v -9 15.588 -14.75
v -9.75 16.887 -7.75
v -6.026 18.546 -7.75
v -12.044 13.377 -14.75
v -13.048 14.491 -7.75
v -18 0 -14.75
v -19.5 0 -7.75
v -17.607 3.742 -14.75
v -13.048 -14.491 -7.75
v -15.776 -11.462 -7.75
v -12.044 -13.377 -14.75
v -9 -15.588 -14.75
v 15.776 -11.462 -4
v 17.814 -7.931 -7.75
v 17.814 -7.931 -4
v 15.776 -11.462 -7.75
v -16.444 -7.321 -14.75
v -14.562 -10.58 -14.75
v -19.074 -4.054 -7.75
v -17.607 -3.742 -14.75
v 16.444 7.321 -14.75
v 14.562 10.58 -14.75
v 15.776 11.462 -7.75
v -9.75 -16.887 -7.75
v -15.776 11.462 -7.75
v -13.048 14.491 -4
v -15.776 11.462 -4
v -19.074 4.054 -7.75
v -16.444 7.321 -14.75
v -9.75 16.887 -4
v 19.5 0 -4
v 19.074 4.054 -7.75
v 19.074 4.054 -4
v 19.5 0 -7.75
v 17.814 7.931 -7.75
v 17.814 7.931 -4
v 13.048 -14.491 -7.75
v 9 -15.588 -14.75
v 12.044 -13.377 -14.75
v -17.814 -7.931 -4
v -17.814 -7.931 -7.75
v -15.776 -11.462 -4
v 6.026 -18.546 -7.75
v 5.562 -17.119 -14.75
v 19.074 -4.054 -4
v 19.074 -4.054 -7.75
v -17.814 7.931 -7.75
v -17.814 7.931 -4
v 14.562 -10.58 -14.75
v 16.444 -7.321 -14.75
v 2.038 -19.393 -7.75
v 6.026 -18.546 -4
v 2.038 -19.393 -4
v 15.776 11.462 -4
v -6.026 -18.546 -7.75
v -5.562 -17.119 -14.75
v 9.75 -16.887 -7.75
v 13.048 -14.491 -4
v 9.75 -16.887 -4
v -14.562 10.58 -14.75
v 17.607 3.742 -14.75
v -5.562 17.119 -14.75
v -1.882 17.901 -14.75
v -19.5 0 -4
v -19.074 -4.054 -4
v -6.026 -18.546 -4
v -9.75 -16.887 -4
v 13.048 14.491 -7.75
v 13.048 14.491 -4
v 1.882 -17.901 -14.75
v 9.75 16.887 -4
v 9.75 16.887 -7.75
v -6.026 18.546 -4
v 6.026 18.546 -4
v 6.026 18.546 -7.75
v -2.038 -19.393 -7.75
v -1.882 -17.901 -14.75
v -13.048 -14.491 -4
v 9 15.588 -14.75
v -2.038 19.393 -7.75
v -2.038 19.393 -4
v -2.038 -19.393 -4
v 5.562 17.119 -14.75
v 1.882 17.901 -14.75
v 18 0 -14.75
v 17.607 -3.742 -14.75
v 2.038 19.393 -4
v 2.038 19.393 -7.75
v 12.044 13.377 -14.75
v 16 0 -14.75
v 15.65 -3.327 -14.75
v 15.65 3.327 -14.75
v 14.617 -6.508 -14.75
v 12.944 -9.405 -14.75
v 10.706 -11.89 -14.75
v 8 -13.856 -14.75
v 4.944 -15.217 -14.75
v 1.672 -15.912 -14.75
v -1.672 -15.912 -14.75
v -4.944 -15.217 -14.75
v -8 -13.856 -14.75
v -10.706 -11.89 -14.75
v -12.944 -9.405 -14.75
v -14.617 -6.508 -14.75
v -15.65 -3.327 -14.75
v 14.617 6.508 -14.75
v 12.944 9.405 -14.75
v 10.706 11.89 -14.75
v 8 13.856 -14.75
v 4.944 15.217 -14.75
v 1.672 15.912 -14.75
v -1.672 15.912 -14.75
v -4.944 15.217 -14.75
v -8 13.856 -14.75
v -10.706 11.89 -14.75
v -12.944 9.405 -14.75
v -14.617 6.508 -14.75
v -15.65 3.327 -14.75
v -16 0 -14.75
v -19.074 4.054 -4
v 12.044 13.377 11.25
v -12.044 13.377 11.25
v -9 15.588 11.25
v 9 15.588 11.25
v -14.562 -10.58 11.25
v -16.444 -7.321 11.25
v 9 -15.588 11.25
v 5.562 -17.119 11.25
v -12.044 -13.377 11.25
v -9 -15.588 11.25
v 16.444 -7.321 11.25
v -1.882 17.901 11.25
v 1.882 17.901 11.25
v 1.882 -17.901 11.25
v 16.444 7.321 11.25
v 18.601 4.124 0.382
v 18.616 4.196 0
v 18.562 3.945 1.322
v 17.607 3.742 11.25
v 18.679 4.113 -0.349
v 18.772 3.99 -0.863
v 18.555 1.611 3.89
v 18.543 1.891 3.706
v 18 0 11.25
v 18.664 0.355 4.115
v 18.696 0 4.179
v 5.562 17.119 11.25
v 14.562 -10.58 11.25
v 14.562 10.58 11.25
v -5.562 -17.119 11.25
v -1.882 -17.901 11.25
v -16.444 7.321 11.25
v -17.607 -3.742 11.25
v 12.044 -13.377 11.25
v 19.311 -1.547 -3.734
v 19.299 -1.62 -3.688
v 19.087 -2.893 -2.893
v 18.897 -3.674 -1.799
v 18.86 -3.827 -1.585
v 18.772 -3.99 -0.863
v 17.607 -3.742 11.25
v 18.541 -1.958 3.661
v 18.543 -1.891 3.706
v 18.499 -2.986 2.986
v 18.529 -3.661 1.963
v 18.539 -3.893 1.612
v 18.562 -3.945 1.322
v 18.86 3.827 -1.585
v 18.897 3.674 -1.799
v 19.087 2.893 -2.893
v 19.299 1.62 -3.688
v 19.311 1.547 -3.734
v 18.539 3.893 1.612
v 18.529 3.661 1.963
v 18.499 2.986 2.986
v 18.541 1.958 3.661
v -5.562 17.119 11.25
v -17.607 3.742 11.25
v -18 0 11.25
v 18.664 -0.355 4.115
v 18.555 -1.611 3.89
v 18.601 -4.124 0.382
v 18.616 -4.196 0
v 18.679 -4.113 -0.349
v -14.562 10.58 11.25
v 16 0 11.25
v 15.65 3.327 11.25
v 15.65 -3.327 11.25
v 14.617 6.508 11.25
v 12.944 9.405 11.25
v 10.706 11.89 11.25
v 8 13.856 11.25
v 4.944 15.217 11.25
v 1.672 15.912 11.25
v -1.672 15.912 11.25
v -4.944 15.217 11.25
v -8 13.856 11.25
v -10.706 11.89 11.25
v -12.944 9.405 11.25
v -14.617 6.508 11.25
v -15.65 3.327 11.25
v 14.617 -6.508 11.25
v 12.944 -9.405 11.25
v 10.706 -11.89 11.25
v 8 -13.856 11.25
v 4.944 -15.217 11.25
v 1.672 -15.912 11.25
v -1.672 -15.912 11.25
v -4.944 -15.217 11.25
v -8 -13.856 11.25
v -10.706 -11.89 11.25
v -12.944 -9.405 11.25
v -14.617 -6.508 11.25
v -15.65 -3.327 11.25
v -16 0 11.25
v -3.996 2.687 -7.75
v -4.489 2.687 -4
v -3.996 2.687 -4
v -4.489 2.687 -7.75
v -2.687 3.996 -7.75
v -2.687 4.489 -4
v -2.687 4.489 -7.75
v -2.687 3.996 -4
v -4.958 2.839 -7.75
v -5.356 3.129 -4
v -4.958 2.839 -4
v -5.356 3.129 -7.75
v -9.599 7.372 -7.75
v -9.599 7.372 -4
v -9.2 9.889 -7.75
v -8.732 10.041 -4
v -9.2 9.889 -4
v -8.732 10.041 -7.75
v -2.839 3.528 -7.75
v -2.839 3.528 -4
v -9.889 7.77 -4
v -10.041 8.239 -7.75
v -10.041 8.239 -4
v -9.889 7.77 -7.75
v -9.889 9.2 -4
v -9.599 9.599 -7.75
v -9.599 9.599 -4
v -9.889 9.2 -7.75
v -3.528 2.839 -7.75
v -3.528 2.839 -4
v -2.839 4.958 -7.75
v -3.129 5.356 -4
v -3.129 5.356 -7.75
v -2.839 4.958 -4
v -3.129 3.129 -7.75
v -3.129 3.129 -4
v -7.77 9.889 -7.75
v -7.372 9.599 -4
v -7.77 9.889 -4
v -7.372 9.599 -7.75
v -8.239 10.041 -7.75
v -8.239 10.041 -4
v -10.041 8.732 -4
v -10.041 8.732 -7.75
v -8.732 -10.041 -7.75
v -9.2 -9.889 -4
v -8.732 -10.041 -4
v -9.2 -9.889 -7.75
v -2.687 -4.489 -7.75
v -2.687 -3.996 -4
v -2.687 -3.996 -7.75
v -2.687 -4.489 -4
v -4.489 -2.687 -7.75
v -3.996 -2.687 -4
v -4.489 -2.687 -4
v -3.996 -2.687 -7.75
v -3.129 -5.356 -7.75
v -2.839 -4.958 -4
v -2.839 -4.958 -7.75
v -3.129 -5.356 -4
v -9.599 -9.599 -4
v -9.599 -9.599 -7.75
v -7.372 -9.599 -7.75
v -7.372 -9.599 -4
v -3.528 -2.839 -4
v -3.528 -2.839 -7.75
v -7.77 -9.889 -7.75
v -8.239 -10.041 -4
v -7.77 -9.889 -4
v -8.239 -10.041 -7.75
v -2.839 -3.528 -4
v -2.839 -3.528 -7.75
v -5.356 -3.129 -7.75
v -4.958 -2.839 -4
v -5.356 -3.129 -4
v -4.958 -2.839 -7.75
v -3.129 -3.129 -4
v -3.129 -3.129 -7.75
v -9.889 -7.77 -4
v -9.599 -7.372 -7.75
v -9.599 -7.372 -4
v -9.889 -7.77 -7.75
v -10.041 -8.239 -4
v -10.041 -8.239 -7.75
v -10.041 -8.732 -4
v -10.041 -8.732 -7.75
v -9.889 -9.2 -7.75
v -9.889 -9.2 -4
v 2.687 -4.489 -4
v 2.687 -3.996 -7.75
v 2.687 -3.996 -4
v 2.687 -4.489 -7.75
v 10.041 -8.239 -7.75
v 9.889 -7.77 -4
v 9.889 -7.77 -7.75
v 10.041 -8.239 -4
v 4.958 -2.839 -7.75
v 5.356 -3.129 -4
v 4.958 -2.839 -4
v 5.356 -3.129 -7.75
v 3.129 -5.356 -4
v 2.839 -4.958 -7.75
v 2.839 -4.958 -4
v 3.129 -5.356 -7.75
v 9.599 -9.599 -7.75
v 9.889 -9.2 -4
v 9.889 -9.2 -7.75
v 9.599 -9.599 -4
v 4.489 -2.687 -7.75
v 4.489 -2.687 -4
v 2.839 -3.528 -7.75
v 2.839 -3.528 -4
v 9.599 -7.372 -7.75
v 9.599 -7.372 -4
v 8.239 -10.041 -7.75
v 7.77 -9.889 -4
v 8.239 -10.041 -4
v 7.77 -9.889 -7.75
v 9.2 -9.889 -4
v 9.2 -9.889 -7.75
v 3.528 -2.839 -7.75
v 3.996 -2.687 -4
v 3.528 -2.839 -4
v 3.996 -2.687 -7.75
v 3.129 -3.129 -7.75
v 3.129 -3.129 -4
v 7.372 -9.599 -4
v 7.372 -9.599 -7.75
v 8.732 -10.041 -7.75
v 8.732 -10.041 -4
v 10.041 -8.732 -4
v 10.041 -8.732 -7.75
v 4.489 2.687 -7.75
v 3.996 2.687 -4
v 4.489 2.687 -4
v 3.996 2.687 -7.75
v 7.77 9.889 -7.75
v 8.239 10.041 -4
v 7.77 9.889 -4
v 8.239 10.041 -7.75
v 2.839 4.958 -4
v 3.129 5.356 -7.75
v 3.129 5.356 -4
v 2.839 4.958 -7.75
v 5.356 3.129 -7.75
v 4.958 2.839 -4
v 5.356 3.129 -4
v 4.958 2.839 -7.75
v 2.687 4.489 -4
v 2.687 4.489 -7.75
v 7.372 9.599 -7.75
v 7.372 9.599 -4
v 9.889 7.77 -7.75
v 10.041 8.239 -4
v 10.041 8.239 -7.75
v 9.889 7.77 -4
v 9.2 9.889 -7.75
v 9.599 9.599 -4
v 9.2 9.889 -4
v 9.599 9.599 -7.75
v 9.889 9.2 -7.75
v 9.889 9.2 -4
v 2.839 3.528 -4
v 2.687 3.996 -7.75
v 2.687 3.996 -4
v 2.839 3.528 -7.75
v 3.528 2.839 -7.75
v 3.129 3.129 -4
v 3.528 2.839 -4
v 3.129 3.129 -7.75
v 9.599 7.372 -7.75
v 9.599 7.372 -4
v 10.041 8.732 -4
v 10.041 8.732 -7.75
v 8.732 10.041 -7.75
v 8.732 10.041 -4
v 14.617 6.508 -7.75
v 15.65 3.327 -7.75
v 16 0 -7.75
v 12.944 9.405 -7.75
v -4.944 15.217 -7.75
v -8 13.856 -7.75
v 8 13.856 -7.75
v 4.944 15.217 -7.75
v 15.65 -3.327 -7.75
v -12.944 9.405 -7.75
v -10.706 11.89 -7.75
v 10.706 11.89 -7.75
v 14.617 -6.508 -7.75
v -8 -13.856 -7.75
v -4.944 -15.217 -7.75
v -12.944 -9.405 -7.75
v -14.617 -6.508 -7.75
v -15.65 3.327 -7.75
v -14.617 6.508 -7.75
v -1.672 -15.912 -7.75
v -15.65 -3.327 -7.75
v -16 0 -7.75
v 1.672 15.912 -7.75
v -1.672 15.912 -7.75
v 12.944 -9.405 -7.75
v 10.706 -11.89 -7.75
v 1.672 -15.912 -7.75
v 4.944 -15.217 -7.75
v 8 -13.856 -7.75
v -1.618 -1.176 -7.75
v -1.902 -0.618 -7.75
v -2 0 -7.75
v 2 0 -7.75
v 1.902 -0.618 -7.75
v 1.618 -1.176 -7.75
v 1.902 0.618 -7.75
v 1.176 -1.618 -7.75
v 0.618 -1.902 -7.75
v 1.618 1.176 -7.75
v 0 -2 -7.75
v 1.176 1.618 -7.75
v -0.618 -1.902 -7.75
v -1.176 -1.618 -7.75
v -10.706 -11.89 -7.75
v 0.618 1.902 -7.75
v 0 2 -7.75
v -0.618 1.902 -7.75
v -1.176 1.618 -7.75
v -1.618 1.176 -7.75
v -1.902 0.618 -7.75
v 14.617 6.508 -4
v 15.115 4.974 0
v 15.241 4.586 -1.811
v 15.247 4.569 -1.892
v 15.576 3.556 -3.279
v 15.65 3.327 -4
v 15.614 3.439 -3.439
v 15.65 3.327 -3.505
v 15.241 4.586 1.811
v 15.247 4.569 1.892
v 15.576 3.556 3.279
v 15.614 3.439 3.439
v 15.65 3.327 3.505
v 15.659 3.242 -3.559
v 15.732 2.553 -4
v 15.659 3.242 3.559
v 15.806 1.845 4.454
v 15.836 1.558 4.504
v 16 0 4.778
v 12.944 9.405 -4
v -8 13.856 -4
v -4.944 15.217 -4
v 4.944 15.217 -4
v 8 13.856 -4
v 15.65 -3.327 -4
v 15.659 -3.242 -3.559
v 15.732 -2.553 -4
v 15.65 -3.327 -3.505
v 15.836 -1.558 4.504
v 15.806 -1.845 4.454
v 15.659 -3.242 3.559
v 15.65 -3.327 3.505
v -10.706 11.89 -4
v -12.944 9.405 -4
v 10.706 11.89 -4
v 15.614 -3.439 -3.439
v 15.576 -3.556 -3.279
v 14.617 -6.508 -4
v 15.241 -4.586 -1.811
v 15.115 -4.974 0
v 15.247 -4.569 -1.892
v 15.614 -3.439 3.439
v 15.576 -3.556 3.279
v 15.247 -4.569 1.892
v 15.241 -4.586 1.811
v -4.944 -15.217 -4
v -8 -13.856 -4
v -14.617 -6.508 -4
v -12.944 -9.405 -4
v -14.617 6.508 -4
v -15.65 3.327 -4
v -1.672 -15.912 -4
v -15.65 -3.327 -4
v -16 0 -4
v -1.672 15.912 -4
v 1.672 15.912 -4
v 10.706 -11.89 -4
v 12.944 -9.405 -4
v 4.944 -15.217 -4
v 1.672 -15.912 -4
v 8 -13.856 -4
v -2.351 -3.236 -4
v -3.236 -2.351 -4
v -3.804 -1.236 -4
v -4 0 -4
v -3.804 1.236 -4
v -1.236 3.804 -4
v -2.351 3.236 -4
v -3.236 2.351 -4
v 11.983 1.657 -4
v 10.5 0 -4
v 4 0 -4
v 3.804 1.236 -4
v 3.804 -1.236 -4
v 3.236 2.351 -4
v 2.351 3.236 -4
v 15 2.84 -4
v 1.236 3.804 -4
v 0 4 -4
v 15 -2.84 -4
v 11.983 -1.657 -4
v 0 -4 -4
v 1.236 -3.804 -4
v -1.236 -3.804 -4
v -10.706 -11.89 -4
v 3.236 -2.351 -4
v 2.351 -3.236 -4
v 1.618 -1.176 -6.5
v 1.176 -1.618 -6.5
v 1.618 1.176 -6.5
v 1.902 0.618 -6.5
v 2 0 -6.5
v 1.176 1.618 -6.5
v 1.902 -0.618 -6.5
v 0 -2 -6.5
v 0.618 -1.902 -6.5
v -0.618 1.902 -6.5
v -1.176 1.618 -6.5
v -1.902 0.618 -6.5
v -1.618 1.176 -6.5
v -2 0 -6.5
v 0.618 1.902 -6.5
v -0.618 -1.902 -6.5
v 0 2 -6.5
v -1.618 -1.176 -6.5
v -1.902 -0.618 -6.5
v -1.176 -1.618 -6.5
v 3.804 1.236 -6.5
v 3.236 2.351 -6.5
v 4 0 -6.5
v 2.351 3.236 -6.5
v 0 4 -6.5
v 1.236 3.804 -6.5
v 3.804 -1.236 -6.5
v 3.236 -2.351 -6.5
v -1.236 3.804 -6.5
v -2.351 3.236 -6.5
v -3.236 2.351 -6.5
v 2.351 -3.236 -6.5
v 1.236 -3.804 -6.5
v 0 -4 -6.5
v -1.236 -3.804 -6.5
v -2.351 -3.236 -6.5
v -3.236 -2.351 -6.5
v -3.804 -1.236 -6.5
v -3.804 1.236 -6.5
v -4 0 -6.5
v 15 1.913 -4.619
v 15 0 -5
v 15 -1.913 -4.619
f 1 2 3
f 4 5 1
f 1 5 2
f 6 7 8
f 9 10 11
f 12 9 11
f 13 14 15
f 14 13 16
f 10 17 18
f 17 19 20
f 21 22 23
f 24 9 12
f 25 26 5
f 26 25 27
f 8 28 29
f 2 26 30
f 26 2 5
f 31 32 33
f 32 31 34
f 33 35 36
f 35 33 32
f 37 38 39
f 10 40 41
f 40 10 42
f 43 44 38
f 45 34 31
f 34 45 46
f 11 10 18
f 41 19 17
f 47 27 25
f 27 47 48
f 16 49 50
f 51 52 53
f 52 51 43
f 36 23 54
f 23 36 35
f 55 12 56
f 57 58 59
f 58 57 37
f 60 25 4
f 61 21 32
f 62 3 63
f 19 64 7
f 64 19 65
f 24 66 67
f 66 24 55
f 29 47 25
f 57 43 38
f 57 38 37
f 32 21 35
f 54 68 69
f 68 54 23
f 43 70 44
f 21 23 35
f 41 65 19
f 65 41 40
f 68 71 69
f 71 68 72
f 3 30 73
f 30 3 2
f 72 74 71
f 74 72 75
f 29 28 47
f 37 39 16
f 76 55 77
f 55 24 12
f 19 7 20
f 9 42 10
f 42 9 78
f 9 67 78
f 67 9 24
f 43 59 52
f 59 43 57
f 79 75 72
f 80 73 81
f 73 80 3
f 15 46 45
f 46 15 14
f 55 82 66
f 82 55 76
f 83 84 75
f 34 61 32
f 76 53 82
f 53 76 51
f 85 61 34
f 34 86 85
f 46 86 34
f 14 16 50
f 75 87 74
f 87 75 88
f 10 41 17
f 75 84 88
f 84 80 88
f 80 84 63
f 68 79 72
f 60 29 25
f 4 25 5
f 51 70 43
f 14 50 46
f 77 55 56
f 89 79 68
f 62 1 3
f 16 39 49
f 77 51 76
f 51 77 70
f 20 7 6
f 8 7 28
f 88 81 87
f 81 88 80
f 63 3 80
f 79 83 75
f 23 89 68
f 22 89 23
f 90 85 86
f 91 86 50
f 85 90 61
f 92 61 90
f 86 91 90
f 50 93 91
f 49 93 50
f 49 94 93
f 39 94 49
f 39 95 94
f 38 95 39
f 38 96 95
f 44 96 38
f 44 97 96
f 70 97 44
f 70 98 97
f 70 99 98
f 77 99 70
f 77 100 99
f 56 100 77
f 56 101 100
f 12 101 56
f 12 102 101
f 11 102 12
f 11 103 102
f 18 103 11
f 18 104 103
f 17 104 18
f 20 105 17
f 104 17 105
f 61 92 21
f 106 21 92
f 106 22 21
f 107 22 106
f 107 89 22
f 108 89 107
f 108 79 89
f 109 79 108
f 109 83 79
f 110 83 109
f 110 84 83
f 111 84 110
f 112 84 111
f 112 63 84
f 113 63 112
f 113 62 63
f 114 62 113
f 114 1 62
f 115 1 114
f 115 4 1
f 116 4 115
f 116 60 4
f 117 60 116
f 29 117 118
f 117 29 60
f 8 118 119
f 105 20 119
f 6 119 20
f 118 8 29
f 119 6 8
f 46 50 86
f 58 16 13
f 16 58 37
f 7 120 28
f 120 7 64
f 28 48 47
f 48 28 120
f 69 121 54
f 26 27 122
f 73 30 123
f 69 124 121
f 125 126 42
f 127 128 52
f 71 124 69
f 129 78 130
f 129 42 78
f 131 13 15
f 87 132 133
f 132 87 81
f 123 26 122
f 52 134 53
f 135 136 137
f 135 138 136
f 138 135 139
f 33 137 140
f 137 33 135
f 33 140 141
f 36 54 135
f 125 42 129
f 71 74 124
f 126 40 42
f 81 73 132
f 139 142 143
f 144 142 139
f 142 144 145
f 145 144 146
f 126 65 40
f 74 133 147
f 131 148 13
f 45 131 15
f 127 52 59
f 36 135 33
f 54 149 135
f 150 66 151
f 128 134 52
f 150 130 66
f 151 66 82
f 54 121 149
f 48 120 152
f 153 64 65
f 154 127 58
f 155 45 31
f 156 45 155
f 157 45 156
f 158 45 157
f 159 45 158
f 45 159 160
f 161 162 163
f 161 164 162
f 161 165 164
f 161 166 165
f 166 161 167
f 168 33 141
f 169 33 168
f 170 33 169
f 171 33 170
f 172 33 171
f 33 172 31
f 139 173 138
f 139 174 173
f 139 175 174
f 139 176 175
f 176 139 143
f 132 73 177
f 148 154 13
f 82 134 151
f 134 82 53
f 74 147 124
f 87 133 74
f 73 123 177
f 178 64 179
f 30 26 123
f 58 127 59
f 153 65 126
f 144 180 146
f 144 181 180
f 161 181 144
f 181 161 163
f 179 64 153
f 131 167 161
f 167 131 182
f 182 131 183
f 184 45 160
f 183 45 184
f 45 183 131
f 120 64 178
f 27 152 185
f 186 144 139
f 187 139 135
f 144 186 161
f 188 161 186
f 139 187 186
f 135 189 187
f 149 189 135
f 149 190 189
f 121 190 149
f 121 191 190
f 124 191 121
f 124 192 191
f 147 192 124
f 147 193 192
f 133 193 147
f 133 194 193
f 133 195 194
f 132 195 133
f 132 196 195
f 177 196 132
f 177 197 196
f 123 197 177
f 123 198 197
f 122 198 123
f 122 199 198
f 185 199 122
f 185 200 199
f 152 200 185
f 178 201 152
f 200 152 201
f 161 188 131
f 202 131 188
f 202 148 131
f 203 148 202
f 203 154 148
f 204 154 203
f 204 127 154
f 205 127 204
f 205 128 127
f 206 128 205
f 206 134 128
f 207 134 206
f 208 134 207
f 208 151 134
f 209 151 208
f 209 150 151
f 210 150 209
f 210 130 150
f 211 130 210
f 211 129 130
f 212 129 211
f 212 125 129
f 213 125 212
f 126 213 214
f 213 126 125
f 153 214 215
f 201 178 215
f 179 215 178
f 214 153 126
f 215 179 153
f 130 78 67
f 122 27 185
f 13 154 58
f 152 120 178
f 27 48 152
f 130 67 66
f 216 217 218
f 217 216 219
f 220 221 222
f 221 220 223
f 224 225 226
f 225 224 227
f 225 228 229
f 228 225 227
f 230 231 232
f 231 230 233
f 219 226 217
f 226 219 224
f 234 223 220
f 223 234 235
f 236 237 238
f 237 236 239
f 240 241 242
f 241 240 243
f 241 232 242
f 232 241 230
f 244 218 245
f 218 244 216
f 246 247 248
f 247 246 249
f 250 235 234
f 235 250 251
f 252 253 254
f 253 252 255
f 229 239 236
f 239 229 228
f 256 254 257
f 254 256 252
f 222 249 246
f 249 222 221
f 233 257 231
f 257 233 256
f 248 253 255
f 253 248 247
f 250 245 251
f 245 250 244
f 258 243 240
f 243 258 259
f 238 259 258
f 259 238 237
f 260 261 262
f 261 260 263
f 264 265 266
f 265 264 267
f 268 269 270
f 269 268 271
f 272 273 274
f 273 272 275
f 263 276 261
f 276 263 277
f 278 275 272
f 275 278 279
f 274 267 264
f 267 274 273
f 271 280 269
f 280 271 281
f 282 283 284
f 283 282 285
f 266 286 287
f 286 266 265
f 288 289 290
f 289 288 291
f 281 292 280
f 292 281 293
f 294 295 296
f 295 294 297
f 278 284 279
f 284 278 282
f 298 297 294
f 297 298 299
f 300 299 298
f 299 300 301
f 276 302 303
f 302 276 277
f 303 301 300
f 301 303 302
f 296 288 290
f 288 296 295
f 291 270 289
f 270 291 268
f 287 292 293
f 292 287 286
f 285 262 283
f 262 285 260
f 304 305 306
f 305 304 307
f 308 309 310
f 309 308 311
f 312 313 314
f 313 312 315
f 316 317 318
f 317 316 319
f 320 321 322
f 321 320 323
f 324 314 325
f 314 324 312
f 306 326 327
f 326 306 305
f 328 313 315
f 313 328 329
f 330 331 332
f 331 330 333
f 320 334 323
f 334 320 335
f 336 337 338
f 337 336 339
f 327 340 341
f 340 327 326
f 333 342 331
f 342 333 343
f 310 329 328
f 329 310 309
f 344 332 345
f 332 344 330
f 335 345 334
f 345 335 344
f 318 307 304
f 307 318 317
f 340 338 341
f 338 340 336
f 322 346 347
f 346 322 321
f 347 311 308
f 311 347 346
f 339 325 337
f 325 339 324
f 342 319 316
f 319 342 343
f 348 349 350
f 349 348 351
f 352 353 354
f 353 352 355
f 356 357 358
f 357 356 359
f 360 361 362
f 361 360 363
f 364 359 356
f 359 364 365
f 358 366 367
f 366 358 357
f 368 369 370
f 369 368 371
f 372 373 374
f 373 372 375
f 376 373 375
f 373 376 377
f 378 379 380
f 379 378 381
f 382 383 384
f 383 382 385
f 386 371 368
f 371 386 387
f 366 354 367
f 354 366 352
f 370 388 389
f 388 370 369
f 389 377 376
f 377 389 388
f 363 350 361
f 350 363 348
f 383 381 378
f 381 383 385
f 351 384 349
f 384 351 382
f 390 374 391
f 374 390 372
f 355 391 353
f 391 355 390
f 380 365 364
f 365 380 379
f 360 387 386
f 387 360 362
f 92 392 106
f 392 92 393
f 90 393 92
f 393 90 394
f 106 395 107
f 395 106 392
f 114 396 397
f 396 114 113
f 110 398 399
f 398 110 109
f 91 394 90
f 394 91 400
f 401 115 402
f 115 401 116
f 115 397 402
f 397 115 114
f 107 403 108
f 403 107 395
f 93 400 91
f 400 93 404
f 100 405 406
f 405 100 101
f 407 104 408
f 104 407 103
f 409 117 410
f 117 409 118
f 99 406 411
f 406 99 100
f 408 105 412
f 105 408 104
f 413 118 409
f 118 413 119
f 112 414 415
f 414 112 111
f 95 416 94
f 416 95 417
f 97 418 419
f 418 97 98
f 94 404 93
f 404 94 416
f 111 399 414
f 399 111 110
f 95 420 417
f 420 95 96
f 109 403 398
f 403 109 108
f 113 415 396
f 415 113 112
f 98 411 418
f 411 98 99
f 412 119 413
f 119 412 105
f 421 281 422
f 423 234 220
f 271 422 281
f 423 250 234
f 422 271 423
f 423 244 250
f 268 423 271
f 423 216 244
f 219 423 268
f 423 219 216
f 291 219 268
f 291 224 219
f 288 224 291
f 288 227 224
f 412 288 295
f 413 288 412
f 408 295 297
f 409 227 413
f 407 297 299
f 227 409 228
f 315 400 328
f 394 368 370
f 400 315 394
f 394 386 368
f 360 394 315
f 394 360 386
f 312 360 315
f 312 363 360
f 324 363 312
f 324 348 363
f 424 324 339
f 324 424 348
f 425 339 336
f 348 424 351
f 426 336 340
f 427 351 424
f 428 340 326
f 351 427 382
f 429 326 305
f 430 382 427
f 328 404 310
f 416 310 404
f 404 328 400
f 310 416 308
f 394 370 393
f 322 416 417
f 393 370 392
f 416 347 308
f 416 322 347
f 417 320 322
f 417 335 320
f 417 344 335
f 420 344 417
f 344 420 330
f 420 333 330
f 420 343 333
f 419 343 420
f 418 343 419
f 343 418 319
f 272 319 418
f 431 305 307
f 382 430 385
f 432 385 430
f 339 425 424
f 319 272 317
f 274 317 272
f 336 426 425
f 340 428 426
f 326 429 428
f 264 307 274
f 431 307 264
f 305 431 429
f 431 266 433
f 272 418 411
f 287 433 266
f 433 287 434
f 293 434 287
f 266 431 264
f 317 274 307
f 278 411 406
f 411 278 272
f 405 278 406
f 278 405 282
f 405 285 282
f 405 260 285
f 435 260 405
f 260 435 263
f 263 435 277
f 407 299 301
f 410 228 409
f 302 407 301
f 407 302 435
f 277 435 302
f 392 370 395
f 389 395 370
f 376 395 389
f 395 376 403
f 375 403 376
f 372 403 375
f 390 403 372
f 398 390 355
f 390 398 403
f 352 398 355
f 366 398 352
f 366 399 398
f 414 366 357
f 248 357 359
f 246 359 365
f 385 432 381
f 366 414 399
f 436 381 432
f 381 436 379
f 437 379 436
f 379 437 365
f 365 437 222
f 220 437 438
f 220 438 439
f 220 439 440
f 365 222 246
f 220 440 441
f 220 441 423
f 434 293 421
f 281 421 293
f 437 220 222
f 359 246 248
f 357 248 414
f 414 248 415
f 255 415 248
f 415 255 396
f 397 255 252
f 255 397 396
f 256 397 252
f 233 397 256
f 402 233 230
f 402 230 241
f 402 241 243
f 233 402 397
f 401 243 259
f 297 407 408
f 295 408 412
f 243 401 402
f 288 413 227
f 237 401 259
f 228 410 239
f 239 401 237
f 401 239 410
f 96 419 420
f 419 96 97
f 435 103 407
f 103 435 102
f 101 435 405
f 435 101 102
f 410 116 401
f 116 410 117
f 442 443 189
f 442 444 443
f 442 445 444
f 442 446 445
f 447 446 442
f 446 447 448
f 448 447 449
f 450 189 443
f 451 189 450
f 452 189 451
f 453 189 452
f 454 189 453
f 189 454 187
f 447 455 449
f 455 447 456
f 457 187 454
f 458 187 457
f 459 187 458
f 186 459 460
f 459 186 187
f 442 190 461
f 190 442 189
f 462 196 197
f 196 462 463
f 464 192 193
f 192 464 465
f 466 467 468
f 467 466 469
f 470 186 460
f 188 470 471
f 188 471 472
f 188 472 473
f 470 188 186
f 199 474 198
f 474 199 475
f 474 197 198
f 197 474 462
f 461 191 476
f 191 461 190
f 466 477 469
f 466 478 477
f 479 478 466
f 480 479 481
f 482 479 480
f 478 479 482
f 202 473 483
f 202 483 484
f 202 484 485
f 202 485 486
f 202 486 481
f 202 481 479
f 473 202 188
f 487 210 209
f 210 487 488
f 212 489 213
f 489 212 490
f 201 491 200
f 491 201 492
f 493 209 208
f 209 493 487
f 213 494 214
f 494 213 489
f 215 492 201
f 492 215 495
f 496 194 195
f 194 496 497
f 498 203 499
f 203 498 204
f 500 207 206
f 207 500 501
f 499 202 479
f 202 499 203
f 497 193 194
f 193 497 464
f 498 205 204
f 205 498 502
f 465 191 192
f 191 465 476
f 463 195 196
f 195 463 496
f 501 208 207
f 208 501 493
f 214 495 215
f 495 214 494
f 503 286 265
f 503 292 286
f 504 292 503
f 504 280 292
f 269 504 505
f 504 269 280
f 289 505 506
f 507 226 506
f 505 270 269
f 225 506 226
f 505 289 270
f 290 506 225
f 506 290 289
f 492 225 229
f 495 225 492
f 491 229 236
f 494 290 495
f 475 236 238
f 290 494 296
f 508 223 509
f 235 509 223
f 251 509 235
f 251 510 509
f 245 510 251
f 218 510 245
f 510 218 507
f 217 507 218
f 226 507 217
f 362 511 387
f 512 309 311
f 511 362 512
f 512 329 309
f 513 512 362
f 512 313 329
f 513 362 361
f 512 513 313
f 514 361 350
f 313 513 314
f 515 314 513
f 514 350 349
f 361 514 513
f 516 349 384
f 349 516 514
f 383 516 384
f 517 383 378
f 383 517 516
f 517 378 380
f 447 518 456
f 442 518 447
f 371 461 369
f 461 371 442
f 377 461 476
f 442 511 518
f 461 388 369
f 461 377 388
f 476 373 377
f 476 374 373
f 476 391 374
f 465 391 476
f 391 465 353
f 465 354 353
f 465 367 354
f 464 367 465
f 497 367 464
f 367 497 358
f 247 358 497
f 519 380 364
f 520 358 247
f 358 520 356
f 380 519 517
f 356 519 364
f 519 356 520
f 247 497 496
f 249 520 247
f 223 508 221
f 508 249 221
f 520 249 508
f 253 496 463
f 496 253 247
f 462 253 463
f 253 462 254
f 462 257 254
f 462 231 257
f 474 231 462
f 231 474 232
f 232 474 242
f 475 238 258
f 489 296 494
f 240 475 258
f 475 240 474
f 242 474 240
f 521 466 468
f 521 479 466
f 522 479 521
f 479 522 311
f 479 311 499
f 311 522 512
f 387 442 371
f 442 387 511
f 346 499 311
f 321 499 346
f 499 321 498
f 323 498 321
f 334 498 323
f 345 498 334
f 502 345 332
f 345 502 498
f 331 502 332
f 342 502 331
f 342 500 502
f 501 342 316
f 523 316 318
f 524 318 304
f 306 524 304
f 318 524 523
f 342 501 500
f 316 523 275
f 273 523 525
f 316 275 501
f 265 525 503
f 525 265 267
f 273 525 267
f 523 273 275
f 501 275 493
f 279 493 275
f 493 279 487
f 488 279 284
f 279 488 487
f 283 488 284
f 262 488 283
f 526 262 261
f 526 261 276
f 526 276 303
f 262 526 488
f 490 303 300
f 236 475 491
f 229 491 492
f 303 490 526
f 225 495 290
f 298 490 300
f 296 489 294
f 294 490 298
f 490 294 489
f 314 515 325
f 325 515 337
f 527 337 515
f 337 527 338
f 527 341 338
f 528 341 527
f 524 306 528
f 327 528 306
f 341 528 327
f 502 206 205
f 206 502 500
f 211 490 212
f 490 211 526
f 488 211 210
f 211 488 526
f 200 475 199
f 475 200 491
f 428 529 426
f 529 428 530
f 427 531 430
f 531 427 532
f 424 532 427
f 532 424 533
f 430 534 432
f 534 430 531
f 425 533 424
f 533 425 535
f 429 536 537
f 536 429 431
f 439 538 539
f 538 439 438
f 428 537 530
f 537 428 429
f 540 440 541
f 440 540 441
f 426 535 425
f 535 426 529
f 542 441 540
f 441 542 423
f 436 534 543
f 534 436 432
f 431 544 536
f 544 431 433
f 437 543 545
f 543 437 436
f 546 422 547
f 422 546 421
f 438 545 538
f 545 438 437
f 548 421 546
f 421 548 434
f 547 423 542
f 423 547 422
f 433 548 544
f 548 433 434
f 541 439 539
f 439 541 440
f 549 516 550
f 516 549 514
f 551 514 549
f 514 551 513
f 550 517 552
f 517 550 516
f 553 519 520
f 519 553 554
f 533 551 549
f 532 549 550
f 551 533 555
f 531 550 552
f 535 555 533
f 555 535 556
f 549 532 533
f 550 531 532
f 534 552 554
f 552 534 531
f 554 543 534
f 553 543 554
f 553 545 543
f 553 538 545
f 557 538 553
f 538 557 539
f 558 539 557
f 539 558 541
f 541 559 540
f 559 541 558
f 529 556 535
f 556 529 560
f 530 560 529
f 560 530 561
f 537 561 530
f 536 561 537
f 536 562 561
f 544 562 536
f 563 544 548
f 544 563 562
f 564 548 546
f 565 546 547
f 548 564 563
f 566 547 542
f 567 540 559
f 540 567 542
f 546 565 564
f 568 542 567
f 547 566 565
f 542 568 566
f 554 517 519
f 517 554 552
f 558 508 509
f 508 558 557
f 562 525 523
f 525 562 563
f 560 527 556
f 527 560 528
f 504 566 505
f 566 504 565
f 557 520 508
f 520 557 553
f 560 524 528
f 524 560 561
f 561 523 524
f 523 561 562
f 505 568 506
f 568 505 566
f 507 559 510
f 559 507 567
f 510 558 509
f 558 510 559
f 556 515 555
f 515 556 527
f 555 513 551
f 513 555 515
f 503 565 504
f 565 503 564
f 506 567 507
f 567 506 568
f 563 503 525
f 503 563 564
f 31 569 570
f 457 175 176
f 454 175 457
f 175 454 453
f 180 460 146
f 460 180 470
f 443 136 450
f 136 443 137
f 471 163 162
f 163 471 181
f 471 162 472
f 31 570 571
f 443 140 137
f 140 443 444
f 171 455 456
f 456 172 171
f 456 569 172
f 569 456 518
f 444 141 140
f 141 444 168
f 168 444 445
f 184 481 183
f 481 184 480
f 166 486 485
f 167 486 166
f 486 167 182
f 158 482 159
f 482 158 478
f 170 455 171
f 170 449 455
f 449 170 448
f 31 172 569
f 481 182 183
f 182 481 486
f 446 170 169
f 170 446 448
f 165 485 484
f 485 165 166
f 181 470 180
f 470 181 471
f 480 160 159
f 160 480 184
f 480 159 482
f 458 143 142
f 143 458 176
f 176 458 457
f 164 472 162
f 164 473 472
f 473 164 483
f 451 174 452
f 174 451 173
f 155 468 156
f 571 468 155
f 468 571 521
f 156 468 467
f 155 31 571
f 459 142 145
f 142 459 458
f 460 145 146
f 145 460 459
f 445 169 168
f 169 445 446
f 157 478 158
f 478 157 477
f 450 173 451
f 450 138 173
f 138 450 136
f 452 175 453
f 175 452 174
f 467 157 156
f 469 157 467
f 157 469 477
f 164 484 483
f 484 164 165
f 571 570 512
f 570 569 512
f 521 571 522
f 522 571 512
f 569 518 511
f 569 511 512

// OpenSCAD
// file: config.scad
/**
 * config.scad
 * 
 * Constants and common methods used for the multi-copter
 * 
 */

//wire openning
wireDiameter = 8;


// suavizar las superficies curvas
//$fs= 1 ; 
//$fa= 1 ; 


///////////// armMount
entryWidth = 50.75/2;
entryHeight = 18.25/2;
entryDepth = 12;

outputWidth = 45/2; //49/2;
outputHeight = 18/2;
outputDepth = 8 +15; //For modelling, this is the position of the further ellipse


armLength = 184; //from the beginning of armMount/malePart to the center of motorMount

//auxiliary method
module oval(w,h, height, center = false) {
 scale([1, h/w, 1]) cylinder(h=height, r=w, center=center);
}


//auxiliary method
module nestedHull()
{
  for(i=[0:$children-2])
    hull()
    {
      children(i);
      children(i+1);
    }
}

//hexer module
hexagon_d = 10;
hexagon_x = 9;
hexagon_y = 5;
hexagon_h = 50; // centered

min_x = - 150;
max_x = 150;
min_y = -100;
max_y = 100;

wall_t = 5;
module hollowify()
difference(convexity=10){
    children(0); 
    linear_extrude(center=true,convexity=10){
        difference(){
            // hexagon array
            for(
                x=[min_x:hexagon_x*2:max_x], 
                y=[min_y:hexagon_y*2:max_y]
            ) translate([x, y, 0]) {
                circle(d=hexagon_d,  center=true, $fn=6);
                translate([hexagon_x, hexagon_y, 0]) circle(d=hexagon_d, center=true, $fn=6);
            }

            minkowski(){
                difference(){
                    translate([min_x, min_y, 0])
                        square([hexagon_x + max_x-min_x, hexagon_y + max_y-min_y]);
                    projection() children(0); 
                }
                circle(r=wall_t);
            }
        }
    }
}
// main file
/**
 * motorMount.scad
 * 
 * Common piece for holding a brushless motor
 * 
 * Created by Diego Viejo after the idea of OpenRC copter from Daniel Noree
 * 21/May/2015
 * 
 */

include<config.scad>

outerDiam = 37;
innerDiam = 32;

height = 26;

platformHeight = 7;
platformWidth = 3.75;

axleDiam = 4;
bottomClearanceDiam = 8;
bottomClearanceHeight = 2.5;

//wire openning
wireDiameter = 8;

module motorMount(action="add") 
translate([0, 0, -(platformHeight + platformWidth + wireDiameter/2)])
{
    if(action == "add")
    {
//        cylinder(d=outerDiam, h=height);
        nestedHull()
        {
            cylinder(d=outerDiam-1, h=0.1);
            translate([0, 0, platformHeight]) cylinder(d=outerDiam+2, h=platformWidth);
            translate([0, 0, height-0.1]) cylinder(d=outerDiam-1, h=0.1);
        }
    }
    else
    {
        
        translate([0, 0, -1]) cylinder(d=innerDiam, h=1+platformHeight);
        translate([0, 0, platformHeight + platformWidth]) cylinder(d=innerDiam, h=height);
        
        //Motor axle if exists
        cylinder(d=axleDiam, h=height, $fn=20);
        
        //Bottom clearance
        translate([0, 0, platformHeight+ platformWidth-bottomClearanceHeight]) 
            cylinder(d=bottomClearanceDiam, h=height, $fn=20);
        
        //Mounting holes
        for(i=[1:2:8])
        {
            rotate(45*i) hull()
            {
                translate([0, 6, 0]) cylinder(d=3+0.15, h=height, $fn=20);
                translate([0, 12, 0]) cylinder(d=3+0.15, h=height, $fn=20);
            }
        }
        
        //wire openning
        translate([innerDiam/2-1, 0, platformHeight + platformWidth + wireDiameter/2]) rotate([0, 90, 0]) cylinder(d2=wireDiameter, d1=wireDiameter+2, h=(outerDiam-innerDiam)/2+2);
        
        translate([innerDiam/2-1, 0, platformHeight + platformWidth + wireDiameter/2]) rotate([0, 90, 180]) cylinder(d2=wireDiameter, d1=wireDiameter+2, h=(outerDiam-innerDiam)/2+2);
    }
}

difference()
{
    motorMount(action="add");
    motorMount(action="remove");
}
